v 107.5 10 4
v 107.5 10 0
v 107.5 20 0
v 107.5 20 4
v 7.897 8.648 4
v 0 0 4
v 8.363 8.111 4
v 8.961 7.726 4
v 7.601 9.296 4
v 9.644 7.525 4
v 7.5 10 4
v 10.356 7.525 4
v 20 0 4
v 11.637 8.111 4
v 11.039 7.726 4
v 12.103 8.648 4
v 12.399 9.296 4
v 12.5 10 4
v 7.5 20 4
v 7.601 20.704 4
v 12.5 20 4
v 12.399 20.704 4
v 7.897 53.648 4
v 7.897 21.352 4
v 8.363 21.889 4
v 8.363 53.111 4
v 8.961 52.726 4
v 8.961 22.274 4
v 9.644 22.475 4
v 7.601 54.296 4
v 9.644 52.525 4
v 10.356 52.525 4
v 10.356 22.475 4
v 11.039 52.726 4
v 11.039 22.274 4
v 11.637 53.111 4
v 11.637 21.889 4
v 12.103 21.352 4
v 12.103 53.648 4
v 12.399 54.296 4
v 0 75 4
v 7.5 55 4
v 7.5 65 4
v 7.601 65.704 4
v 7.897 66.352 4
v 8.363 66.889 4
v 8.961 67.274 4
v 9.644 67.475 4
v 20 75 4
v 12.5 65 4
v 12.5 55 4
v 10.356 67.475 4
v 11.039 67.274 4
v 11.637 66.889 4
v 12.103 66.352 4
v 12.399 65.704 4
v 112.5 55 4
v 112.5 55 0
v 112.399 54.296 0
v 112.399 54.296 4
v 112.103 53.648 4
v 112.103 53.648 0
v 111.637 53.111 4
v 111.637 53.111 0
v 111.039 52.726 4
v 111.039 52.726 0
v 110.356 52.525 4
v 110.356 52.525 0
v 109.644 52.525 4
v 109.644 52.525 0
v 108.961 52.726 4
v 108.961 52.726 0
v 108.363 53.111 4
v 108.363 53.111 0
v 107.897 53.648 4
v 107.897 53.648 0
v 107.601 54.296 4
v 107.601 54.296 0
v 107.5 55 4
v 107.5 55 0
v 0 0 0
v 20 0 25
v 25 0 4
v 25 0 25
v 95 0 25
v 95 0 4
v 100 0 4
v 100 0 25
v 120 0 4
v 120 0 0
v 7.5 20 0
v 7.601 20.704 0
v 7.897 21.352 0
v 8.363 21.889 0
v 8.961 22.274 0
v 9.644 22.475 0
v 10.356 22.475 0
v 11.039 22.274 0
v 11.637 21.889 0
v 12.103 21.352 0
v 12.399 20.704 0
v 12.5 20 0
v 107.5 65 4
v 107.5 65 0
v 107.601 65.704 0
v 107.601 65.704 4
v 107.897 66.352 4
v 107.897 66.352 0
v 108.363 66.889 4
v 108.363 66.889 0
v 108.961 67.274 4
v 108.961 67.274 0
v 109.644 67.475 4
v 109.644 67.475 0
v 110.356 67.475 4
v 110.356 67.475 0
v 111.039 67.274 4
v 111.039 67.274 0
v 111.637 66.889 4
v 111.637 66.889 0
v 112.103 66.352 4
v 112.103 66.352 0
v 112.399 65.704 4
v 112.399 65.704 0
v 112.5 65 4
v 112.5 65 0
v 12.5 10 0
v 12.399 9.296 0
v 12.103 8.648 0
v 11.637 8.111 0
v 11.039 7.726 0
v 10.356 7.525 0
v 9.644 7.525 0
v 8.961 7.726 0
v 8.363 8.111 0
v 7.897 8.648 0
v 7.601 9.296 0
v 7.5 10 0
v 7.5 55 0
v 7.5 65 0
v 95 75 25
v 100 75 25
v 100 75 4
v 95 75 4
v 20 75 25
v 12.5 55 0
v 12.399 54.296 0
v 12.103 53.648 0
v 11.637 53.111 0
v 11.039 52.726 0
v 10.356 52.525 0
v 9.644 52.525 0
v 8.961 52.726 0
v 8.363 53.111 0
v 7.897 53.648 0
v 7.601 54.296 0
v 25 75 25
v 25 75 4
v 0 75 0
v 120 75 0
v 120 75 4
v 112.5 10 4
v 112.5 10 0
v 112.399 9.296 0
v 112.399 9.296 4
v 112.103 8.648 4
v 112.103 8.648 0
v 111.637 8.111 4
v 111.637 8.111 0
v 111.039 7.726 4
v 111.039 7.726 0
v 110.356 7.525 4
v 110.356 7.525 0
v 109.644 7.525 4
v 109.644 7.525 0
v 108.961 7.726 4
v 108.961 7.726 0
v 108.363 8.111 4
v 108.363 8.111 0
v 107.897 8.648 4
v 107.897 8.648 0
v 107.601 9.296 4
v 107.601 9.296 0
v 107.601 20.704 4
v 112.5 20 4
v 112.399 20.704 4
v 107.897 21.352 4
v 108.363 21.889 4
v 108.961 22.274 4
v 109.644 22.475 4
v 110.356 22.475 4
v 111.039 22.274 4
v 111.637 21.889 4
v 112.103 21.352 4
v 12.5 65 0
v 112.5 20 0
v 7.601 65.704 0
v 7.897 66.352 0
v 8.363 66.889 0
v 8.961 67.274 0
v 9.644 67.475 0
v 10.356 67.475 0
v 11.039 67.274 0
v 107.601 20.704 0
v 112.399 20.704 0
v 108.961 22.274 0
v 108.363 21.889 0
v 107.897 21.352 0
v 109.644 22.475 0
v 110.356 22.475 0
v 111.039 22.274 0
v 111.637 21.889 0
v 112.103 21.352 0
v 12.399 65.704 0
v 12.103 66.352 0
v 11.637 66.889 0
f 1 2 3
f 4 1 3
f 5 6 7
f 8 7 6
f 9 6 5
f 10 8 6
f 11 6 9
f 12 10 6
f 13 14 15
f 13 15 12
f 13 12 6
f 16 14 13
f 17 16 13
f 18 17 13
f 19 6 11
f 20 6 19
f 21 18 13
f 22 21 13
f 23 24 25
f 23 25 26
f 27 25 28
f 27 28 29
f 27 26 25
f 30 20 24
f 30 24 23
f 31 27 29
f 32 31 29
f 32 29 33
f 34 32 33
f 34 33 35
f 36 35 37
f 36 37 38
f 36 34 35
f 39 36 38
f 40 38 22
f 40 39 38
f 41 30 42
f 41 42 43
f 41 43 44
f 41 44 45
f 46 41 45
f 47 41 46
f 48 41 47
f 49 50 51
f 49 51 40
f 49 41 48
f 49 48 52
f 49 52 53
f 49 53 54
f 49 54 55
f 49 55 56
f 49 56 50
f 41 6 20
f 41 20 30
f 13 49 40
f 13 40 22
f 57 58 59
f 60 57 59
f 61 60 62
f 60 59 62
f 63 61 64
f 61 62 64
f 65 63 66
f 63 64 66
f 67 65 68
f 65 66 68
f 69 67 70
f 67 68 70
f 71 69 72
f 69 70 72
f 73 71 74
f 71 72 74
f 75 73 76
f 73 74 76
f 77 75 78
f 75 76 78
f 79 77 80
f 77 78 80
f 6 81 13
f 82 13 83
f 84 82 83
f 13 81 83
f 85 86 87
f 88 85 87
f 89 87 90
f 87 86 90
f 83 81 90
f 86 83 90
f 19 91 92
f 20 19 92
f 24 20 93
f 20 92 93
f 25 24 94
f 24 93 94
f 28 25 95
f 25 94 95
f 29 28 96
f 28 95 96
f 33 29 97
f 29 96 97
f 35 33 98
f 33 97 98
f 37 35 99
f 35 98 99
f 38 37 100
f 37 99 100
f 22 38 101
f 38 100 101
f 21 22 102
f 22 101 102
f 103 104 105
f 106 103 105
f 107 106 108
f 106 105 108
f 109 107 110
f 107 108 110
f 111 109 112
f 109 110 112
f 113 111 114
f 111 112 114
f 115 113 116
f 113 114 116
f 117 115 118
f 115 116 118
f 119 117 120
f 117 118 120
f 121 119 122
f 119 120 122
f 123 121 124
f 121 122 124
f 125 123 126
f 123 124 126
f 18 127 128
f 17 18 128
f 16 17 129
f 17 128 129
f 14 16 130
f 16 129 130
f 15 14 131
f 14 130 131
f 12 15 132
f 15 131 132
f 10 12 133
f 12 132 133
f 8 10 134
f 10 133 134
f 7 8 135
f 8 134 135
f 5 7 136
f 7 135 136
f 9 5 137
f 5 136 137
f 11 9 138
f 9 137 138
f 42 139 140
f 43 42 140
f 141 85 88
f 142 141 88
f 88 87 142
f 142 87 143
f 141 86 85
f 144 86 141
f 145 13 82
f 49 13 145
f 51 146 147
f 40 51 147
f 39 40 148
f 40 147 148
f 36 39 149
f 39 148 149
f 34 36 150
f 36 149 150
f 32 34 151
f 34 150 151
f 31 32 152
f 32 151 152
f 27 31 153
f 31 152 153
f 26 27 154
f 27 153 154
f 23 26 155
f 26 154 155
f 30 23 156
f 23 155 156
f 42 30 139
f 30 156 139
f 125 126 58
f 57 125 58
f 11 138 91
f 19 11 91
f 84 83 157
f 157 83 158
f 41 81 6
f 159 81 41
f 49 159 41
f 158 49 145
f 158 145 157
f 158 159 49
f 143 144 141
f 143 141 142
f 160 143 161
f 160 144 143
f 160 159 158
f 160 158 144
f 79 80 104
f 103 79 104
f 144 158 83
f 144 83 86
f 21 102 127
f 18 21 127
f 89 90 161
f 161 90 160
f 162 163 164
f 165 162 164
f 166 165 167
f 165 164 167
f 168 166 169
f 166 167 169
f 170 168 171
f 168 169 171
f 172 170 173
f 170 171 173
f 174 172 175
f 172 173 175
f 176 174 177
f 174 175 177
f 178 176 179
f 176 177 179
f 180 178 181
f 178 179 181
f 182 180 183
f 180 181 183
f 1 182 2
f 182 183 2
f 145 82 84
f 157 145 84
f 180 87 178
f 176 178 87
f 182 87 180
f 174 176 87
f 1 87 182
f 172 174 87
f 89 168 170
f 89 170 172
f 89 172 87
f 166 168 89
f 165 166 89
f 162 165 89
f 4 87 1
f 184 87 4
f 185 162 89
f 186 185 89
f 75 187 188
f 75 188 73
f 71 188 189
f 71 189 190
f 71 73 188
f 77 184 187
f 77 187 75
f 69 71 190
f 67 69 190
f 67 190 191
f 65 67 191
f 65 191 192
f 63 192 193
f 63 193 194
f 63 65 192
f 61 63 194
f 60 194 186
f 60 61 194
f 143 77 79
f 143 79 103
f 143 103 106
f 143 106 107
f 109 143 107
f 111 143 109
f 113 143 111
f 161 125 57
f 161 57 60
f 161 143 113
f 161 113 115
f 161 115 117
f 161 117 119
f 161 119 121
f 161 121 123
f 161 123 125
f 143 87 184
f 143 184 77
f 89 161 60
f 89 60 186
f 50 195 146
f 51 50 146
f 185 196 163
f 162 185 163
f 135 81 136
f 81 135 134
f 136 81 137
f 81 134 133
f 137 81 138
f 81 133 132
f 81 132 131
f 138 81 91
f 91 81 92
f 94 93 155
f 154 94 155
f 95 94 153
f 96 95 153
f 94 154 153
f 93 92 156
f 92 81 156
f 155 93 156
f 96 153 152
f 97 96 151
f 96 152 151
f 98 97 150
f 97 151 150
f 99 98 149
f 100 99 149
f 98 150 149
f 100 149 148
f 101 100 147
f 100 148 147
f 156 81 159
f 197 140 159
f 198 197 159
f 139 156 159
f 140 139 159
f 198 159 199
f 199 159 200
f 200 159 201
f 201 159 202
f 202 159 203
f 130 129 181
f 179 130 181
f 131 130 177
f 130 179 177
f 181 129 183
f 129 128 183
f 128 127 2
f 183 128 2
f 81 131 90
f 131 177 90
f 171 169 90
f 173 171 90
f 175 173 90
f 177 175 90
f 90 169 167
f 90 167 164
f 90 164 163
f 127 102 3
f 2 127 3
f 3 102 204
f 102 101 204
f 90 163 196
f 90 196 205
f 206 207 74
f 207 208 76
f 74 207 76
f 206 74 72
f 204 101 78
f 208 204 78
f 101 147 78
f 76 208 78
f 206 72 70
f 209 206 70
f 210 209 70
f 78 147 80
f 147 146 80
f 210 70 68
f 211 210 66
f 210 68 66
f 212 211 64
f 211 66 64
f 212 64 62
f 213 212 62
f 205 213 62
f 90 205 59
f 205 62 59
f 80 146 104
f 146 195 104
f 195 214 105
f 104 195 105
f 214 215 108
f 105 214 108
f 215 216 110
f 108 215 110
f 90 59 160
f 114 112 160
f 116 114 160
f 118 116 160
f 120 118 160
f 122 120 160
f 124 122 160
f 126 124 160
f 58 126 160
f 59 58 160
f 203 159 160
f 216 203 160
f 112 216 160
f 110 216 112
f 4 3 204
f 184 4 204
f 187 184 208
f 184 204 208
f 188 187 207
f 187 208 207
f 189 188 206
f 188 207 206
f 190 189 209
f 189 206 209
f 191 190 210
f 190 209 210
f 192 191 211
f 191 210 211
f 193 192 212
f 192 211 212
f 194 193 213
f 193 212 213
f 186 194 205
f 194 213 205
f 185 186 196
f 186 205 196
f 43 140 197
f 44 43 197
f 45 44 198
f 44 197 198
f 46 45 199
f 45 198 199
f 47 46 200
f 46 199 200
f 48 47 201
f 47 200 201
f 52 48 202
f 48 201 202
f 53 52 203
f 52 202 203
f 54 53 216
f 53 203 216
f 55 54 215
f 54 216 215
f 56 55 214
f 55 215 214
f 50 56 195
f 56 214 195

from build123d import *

# Parameters (mm, degrees)
SKETCH_1_W          = 120
SKETCH_1_H          = 75
EXTRUDE_1_DEPTH     = 4
SKETCH_2_W          = 5
SKETCH_2_H          = 75
EXTRUDE_2_DEPTH     = 21
CUT_EXTRUDE_1_DEPTH = 144.701078632


with BuildPart() as part:
    # 草图1 → 凸台-拉伸1 (new body)
    with BuildSketch(Plane.XY):
        with Locations((60, 37.5)):
            Rectangle(SKETCH_1_W, SKETCH_1_H)
    extrude(amount=EXTRUDE_1_DEPTH)

    # 草图2 → 凸台-拉伸2 (add)
    with BuildSketch(Plane.XY.offset(4)):
        with Locations((22.5, 37.5)):
            Rectangle(SKETCH_2_W, SKETCH_2_H)
        with Locations((97.5, 37.5)):
            Rectangle(SKETCH_2_W, SKETCH_2_H)
    extrude(amount=EXTRUDE_2_DEPTH)

    # 草图3 → 切除-拉伸1 (cut, through all)
    with BuildSketch(Plane(origin=(0, 0, 0), x_dir=(-1, 0, 0), z_dir=(0, 0, -1))):
        with BuildLine():
            Line((-112.5, 65), (-112.5, 55))
            ThreePointArc((-112.5, 55), (-110, 52.5), (-107.5, 55))
            Line((-107.5, 55), (-107.5, 65))
            ThreePointArc((-107.5, 65), (-110, 67.5), (-112.5, 65))
        make_face()
        with BuildLine():
            Line((-107.5, 10), (-107.5, 20))
            ThreePointArc((-107.5, 20), (-110, 22.5), (-112.5, 20))
            Line((-112.5, 20), (-112.5, 10))
            ThreePointArc((-112.5, 10), (-110, 7.5), (-107.5, 10))
        make_face()
        with BuildLine():
            Line((-7.5, 10), (-7.5, 20))
            ThreePointArc((-7.5, 20), (-10, 22.5), (-12.5, 20))
            Line((-12.5, 20), (-12.5, 10))
            ThreePointArc((-12.5, 10), (-10, 7.5), (-7.5, 10))
        make_face()
        with BuildLine():
            Line((-12.5, 65), (-12.5, 55))
            ThreePointArc((-12.5, 55), (-10, 52.5), (-7.5, 55))
            Line((-7.5, 55), (-7.5, 65))
            ThreePointArc((-7.5, 65), (-10, 67.5), (-12.5, 65))
        make_face()
    extrude(amount=-CUT_EXTRUDE_1_DEPTH, mode=Mode.SUBTRACT)


solid = part.part
